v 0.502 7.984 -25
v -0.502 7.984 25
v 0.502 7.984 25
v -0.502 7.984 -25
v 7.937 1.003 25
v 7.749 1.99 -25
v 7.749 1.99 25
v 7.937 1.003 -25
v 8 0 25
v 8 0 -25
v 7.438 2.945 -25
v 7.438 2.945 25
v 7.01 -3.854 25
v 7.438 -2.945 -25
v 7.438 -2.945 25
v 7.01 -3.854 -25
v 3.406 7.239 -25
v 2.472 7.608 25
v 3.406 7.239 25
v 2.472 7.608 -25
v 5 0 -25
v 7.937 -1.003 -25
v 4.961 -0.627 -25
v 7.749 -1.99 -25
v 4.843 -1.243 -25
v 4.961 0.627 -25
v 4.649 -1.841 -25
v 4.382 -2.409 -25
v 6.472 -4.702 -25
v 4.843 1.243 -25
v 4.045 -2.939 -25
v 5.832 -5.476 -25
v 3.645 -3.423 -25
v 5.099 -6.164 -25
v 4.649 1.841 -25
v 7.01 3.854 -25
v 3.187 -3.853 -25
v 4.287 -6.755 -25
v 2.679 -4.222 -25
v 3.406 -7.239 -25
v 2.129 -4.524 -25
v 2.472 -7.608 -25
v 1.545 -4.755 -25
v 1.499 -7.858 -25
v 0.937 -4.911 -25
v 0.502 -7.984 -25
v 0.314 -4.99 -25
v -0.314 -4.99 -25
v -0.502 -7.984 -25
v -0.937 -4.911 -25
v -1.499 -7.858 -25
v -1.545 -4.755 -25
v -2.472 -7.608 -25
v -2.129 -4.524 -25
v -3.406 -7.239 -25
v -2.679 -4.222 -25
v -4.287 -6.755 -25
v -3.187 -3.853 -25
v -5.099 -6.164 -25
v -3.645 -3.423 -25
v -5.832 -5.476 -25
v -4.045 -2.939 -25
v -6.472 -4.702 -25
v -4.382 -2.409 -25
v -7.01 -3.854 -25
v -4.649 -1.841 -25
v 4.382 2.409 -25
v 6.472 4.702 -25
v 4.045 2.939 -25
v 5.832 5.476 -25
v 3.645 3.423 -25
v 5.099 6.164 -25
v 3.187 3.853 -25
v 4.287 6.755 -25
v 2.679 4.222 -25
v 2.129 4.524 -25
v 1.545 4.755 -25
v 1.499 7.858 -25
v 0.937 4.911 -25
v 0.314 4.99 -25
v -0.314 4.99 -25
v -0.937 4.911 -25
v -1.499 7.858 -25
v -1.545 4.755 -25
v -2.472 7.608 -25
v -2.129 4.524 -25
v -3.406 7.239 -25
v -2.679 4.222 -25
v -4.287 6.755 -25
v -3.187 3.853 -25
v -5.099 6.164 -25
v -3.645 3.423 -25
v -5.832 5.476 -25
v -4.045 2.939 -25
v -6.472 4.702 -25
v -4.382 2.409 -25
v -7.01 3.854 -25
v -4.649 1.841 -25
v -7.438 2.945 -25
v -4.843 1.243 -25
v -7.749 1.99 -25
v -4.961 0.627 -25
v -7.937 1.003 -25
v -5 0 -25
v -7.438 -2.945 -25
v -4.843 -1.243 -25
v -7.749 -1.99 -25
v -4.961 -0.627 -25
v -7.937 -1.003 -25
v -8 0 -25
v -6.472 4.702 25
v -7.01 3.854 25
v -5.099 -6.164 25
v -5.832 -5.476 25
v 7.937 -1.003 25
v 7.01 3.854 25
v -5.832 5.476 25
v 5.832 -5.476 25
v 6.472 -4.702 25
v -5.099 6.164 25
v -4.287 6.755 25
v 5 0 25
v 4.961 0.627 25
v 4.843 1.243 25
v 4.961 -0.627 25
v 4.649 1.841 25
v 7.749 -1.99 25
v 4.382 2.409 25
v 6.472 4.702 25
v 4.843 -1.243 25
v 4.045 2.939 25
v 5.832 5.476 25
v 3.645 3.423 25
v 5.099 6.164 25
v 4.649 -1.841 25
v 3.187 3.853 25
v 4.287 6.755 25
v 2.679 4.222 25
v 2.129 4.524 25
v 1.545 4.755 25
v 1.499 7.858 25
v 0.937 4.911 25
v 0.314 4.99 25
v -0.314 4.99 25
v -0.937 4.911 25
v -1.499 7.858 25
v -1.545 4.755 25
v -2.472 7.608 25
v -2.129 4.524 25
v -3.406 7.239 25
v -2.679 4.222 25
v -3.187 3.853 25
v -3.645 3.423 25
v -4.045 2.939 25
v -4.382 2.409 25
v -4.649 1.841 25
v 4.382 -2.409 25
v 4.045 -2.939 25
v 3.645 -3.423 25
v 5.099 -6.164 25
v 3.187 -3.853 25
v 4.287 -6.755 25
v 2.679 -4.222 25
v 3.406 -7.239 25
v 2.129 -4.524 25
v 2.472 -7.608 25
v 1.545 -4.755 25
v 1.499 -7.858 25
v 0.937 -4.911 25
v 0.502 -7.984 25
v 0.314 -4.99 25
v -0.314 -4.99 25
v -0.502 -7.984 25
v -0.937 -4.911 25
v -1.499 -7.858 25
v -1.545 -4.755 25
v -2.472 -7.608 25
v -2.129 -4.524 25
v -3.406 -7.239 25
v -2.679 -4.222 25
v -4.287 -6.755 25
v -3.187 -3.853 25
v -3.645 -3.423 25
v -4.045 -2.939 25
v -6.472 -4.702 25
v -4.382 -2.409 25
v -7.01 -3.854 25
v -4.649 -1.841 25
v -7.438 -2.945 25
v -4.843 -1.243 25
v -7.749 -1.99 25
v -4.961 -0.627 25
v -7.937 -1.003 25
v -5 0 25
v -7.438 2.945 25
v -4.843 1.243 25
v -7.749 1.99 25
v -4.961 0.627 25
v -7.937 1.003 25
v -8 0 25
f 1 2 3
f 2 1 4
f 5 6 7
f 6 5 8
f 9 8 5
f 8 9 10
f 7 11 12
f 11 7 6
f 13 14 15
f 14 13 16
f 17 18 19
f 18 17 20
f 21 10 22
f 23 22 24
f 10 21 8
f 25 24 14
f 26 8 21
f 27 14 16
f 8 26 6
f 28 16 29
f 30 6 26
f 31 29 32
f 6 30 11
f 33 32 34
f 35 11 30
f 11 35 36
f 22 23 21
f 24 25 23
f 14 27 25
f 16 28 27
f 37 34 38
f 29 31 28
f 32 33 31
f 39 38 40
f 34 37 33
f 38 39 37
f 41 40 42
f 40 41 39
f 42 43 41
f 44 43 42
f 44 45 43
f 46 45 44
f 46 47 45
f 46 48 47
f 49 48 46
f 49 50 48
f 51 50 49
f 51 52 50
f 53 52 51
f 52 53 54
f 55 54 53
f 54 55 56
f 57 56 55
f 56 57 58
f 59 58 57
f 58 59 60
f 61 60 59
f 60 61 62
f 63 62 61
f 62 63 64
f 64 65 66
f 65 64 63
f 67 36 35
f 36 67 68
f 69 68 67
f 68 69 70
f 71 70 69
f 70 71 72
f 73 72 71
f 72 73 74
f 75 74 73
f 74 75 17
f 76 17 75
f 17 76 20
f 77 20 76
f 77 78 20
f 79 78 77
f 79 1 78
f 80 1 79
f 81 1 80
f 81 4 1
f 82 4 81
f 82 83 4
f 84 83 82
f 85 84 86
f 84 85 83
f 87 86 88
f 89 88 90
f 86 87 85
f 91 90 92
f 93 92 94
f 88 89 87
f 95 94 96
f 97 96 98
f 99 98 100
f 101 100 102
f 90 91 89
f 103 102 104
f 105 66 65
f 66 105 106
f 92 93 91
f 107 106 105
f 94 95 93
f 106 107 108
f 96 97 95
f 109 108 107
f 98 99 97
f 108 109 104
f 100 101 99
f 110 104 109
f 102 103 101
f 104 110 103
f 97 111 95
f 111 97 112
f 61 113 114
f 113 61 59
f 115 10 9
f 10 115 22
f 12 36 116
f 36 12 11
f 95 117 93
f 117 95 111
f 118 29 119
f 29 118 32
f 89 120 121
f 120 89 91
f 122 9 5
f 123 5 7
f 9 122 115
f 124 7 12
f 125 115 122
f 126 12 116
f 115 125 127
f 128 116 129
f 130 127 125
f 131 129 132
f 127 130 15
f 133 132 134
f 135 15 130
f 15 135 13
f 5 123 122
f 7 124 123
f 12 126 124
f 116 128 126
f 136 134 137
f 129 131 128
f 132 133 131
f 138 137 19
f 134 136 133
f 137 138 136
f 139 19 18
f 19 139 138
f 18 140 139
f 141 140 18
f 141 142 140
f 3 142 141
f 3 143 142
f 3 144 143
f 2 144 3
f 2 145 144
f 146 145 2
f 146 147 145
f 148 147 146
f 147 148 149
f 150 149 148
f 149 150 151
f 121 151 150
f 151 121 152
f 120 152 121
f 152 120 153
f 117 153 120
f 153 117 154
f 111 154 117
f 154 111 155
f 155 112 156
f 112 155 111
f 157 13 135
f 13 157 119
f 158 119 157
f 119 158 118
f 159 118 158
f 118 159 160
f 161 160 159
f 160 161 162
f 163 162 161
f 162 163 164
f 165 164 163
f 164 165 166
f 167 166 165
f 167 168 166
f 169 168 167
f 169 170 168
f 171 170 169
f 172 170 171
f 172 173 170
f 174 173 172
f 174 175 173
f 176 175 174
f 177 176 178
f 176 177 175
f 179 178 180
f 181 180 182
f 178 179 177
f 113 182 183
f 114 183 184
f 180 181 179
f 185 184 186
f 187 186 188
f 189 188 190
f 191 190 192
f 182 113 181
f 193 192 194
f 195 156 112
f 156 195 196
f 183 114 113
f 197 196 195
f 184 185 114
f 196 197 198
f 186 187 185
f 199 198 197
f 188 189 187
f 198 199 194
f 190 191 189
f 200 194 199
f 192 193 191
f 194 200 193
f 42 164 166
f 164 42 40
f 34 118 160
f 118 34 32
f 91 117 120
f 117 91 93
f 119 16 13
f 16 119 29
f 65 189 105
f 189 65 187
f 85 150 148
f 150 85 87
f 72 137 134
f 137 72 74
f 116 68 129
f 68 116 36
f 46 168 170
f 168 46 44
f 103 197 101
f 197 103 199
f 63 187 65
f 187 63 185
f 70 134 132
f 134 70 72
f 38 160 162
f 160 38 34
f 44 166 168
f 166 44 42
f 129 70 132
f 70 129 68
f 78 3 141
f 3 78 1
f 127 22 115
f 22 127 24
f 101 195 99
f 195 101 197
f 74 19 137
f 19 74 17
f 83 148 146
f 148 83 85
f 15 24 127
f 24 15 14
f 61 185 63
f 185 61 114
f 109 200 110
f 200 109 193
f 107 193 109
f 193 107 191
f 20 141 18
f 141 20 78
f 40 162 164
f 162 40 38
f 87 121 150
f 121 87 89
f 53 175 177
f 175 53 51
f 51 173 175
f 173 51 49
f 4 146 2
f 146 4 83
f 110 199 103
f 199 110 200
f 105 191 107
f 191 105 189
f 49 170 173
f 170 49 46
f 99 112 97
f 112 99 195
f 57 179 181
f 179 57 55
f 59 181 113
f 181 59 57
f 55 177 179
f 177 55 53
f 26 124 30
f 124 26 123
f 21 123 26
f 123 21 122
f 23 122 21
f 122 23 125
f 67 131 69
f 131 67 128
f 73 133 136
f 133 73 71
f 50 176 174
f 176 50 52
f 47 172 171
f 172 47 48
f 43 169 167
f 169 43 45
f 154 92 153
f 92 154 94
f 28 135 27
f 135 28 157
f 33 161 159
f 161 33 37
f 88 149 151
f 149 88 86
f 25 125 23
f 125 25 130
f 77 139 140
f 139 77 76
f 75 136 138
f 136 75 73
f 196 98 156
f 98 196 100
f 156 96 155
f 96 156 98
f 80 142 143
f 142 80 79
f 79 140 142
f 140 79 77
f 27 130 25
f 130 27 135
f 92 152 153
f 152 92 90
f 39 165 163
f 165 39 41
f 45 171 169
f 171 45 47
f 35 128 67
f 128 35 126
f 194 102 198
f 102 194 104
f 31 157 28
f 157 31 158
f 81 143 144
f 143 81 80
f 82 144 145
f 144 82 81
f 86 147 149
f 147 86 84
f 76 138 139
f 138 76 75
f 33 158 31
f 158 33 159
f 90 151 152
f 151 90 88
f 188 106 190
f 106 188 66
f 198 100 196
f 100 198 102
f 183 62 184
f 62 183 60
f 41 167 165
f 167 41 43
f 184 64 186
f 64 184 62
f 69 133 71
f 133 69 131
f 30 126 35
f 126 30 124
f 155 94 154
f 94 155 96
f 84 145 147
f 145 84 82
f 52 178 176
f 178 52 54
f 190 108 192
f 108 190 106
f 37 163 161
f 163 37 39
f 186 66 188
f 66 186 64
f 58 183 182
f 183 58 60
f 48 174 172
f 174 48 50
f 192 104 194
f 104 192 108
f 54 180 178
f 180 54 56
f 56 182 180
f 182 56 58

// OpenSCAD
$fn = 50;


difference() {
	union() {
		translate(v = [0, 0, -25.0000000000]) {
			cylinder(h = 50, r = 8.0000000000);
		}
	}
	union() {
		translate(v = [0, 0, -100.0000000000]) {
			cylinder(h = 200, r = 5.0000000000);
		}
	}
}
